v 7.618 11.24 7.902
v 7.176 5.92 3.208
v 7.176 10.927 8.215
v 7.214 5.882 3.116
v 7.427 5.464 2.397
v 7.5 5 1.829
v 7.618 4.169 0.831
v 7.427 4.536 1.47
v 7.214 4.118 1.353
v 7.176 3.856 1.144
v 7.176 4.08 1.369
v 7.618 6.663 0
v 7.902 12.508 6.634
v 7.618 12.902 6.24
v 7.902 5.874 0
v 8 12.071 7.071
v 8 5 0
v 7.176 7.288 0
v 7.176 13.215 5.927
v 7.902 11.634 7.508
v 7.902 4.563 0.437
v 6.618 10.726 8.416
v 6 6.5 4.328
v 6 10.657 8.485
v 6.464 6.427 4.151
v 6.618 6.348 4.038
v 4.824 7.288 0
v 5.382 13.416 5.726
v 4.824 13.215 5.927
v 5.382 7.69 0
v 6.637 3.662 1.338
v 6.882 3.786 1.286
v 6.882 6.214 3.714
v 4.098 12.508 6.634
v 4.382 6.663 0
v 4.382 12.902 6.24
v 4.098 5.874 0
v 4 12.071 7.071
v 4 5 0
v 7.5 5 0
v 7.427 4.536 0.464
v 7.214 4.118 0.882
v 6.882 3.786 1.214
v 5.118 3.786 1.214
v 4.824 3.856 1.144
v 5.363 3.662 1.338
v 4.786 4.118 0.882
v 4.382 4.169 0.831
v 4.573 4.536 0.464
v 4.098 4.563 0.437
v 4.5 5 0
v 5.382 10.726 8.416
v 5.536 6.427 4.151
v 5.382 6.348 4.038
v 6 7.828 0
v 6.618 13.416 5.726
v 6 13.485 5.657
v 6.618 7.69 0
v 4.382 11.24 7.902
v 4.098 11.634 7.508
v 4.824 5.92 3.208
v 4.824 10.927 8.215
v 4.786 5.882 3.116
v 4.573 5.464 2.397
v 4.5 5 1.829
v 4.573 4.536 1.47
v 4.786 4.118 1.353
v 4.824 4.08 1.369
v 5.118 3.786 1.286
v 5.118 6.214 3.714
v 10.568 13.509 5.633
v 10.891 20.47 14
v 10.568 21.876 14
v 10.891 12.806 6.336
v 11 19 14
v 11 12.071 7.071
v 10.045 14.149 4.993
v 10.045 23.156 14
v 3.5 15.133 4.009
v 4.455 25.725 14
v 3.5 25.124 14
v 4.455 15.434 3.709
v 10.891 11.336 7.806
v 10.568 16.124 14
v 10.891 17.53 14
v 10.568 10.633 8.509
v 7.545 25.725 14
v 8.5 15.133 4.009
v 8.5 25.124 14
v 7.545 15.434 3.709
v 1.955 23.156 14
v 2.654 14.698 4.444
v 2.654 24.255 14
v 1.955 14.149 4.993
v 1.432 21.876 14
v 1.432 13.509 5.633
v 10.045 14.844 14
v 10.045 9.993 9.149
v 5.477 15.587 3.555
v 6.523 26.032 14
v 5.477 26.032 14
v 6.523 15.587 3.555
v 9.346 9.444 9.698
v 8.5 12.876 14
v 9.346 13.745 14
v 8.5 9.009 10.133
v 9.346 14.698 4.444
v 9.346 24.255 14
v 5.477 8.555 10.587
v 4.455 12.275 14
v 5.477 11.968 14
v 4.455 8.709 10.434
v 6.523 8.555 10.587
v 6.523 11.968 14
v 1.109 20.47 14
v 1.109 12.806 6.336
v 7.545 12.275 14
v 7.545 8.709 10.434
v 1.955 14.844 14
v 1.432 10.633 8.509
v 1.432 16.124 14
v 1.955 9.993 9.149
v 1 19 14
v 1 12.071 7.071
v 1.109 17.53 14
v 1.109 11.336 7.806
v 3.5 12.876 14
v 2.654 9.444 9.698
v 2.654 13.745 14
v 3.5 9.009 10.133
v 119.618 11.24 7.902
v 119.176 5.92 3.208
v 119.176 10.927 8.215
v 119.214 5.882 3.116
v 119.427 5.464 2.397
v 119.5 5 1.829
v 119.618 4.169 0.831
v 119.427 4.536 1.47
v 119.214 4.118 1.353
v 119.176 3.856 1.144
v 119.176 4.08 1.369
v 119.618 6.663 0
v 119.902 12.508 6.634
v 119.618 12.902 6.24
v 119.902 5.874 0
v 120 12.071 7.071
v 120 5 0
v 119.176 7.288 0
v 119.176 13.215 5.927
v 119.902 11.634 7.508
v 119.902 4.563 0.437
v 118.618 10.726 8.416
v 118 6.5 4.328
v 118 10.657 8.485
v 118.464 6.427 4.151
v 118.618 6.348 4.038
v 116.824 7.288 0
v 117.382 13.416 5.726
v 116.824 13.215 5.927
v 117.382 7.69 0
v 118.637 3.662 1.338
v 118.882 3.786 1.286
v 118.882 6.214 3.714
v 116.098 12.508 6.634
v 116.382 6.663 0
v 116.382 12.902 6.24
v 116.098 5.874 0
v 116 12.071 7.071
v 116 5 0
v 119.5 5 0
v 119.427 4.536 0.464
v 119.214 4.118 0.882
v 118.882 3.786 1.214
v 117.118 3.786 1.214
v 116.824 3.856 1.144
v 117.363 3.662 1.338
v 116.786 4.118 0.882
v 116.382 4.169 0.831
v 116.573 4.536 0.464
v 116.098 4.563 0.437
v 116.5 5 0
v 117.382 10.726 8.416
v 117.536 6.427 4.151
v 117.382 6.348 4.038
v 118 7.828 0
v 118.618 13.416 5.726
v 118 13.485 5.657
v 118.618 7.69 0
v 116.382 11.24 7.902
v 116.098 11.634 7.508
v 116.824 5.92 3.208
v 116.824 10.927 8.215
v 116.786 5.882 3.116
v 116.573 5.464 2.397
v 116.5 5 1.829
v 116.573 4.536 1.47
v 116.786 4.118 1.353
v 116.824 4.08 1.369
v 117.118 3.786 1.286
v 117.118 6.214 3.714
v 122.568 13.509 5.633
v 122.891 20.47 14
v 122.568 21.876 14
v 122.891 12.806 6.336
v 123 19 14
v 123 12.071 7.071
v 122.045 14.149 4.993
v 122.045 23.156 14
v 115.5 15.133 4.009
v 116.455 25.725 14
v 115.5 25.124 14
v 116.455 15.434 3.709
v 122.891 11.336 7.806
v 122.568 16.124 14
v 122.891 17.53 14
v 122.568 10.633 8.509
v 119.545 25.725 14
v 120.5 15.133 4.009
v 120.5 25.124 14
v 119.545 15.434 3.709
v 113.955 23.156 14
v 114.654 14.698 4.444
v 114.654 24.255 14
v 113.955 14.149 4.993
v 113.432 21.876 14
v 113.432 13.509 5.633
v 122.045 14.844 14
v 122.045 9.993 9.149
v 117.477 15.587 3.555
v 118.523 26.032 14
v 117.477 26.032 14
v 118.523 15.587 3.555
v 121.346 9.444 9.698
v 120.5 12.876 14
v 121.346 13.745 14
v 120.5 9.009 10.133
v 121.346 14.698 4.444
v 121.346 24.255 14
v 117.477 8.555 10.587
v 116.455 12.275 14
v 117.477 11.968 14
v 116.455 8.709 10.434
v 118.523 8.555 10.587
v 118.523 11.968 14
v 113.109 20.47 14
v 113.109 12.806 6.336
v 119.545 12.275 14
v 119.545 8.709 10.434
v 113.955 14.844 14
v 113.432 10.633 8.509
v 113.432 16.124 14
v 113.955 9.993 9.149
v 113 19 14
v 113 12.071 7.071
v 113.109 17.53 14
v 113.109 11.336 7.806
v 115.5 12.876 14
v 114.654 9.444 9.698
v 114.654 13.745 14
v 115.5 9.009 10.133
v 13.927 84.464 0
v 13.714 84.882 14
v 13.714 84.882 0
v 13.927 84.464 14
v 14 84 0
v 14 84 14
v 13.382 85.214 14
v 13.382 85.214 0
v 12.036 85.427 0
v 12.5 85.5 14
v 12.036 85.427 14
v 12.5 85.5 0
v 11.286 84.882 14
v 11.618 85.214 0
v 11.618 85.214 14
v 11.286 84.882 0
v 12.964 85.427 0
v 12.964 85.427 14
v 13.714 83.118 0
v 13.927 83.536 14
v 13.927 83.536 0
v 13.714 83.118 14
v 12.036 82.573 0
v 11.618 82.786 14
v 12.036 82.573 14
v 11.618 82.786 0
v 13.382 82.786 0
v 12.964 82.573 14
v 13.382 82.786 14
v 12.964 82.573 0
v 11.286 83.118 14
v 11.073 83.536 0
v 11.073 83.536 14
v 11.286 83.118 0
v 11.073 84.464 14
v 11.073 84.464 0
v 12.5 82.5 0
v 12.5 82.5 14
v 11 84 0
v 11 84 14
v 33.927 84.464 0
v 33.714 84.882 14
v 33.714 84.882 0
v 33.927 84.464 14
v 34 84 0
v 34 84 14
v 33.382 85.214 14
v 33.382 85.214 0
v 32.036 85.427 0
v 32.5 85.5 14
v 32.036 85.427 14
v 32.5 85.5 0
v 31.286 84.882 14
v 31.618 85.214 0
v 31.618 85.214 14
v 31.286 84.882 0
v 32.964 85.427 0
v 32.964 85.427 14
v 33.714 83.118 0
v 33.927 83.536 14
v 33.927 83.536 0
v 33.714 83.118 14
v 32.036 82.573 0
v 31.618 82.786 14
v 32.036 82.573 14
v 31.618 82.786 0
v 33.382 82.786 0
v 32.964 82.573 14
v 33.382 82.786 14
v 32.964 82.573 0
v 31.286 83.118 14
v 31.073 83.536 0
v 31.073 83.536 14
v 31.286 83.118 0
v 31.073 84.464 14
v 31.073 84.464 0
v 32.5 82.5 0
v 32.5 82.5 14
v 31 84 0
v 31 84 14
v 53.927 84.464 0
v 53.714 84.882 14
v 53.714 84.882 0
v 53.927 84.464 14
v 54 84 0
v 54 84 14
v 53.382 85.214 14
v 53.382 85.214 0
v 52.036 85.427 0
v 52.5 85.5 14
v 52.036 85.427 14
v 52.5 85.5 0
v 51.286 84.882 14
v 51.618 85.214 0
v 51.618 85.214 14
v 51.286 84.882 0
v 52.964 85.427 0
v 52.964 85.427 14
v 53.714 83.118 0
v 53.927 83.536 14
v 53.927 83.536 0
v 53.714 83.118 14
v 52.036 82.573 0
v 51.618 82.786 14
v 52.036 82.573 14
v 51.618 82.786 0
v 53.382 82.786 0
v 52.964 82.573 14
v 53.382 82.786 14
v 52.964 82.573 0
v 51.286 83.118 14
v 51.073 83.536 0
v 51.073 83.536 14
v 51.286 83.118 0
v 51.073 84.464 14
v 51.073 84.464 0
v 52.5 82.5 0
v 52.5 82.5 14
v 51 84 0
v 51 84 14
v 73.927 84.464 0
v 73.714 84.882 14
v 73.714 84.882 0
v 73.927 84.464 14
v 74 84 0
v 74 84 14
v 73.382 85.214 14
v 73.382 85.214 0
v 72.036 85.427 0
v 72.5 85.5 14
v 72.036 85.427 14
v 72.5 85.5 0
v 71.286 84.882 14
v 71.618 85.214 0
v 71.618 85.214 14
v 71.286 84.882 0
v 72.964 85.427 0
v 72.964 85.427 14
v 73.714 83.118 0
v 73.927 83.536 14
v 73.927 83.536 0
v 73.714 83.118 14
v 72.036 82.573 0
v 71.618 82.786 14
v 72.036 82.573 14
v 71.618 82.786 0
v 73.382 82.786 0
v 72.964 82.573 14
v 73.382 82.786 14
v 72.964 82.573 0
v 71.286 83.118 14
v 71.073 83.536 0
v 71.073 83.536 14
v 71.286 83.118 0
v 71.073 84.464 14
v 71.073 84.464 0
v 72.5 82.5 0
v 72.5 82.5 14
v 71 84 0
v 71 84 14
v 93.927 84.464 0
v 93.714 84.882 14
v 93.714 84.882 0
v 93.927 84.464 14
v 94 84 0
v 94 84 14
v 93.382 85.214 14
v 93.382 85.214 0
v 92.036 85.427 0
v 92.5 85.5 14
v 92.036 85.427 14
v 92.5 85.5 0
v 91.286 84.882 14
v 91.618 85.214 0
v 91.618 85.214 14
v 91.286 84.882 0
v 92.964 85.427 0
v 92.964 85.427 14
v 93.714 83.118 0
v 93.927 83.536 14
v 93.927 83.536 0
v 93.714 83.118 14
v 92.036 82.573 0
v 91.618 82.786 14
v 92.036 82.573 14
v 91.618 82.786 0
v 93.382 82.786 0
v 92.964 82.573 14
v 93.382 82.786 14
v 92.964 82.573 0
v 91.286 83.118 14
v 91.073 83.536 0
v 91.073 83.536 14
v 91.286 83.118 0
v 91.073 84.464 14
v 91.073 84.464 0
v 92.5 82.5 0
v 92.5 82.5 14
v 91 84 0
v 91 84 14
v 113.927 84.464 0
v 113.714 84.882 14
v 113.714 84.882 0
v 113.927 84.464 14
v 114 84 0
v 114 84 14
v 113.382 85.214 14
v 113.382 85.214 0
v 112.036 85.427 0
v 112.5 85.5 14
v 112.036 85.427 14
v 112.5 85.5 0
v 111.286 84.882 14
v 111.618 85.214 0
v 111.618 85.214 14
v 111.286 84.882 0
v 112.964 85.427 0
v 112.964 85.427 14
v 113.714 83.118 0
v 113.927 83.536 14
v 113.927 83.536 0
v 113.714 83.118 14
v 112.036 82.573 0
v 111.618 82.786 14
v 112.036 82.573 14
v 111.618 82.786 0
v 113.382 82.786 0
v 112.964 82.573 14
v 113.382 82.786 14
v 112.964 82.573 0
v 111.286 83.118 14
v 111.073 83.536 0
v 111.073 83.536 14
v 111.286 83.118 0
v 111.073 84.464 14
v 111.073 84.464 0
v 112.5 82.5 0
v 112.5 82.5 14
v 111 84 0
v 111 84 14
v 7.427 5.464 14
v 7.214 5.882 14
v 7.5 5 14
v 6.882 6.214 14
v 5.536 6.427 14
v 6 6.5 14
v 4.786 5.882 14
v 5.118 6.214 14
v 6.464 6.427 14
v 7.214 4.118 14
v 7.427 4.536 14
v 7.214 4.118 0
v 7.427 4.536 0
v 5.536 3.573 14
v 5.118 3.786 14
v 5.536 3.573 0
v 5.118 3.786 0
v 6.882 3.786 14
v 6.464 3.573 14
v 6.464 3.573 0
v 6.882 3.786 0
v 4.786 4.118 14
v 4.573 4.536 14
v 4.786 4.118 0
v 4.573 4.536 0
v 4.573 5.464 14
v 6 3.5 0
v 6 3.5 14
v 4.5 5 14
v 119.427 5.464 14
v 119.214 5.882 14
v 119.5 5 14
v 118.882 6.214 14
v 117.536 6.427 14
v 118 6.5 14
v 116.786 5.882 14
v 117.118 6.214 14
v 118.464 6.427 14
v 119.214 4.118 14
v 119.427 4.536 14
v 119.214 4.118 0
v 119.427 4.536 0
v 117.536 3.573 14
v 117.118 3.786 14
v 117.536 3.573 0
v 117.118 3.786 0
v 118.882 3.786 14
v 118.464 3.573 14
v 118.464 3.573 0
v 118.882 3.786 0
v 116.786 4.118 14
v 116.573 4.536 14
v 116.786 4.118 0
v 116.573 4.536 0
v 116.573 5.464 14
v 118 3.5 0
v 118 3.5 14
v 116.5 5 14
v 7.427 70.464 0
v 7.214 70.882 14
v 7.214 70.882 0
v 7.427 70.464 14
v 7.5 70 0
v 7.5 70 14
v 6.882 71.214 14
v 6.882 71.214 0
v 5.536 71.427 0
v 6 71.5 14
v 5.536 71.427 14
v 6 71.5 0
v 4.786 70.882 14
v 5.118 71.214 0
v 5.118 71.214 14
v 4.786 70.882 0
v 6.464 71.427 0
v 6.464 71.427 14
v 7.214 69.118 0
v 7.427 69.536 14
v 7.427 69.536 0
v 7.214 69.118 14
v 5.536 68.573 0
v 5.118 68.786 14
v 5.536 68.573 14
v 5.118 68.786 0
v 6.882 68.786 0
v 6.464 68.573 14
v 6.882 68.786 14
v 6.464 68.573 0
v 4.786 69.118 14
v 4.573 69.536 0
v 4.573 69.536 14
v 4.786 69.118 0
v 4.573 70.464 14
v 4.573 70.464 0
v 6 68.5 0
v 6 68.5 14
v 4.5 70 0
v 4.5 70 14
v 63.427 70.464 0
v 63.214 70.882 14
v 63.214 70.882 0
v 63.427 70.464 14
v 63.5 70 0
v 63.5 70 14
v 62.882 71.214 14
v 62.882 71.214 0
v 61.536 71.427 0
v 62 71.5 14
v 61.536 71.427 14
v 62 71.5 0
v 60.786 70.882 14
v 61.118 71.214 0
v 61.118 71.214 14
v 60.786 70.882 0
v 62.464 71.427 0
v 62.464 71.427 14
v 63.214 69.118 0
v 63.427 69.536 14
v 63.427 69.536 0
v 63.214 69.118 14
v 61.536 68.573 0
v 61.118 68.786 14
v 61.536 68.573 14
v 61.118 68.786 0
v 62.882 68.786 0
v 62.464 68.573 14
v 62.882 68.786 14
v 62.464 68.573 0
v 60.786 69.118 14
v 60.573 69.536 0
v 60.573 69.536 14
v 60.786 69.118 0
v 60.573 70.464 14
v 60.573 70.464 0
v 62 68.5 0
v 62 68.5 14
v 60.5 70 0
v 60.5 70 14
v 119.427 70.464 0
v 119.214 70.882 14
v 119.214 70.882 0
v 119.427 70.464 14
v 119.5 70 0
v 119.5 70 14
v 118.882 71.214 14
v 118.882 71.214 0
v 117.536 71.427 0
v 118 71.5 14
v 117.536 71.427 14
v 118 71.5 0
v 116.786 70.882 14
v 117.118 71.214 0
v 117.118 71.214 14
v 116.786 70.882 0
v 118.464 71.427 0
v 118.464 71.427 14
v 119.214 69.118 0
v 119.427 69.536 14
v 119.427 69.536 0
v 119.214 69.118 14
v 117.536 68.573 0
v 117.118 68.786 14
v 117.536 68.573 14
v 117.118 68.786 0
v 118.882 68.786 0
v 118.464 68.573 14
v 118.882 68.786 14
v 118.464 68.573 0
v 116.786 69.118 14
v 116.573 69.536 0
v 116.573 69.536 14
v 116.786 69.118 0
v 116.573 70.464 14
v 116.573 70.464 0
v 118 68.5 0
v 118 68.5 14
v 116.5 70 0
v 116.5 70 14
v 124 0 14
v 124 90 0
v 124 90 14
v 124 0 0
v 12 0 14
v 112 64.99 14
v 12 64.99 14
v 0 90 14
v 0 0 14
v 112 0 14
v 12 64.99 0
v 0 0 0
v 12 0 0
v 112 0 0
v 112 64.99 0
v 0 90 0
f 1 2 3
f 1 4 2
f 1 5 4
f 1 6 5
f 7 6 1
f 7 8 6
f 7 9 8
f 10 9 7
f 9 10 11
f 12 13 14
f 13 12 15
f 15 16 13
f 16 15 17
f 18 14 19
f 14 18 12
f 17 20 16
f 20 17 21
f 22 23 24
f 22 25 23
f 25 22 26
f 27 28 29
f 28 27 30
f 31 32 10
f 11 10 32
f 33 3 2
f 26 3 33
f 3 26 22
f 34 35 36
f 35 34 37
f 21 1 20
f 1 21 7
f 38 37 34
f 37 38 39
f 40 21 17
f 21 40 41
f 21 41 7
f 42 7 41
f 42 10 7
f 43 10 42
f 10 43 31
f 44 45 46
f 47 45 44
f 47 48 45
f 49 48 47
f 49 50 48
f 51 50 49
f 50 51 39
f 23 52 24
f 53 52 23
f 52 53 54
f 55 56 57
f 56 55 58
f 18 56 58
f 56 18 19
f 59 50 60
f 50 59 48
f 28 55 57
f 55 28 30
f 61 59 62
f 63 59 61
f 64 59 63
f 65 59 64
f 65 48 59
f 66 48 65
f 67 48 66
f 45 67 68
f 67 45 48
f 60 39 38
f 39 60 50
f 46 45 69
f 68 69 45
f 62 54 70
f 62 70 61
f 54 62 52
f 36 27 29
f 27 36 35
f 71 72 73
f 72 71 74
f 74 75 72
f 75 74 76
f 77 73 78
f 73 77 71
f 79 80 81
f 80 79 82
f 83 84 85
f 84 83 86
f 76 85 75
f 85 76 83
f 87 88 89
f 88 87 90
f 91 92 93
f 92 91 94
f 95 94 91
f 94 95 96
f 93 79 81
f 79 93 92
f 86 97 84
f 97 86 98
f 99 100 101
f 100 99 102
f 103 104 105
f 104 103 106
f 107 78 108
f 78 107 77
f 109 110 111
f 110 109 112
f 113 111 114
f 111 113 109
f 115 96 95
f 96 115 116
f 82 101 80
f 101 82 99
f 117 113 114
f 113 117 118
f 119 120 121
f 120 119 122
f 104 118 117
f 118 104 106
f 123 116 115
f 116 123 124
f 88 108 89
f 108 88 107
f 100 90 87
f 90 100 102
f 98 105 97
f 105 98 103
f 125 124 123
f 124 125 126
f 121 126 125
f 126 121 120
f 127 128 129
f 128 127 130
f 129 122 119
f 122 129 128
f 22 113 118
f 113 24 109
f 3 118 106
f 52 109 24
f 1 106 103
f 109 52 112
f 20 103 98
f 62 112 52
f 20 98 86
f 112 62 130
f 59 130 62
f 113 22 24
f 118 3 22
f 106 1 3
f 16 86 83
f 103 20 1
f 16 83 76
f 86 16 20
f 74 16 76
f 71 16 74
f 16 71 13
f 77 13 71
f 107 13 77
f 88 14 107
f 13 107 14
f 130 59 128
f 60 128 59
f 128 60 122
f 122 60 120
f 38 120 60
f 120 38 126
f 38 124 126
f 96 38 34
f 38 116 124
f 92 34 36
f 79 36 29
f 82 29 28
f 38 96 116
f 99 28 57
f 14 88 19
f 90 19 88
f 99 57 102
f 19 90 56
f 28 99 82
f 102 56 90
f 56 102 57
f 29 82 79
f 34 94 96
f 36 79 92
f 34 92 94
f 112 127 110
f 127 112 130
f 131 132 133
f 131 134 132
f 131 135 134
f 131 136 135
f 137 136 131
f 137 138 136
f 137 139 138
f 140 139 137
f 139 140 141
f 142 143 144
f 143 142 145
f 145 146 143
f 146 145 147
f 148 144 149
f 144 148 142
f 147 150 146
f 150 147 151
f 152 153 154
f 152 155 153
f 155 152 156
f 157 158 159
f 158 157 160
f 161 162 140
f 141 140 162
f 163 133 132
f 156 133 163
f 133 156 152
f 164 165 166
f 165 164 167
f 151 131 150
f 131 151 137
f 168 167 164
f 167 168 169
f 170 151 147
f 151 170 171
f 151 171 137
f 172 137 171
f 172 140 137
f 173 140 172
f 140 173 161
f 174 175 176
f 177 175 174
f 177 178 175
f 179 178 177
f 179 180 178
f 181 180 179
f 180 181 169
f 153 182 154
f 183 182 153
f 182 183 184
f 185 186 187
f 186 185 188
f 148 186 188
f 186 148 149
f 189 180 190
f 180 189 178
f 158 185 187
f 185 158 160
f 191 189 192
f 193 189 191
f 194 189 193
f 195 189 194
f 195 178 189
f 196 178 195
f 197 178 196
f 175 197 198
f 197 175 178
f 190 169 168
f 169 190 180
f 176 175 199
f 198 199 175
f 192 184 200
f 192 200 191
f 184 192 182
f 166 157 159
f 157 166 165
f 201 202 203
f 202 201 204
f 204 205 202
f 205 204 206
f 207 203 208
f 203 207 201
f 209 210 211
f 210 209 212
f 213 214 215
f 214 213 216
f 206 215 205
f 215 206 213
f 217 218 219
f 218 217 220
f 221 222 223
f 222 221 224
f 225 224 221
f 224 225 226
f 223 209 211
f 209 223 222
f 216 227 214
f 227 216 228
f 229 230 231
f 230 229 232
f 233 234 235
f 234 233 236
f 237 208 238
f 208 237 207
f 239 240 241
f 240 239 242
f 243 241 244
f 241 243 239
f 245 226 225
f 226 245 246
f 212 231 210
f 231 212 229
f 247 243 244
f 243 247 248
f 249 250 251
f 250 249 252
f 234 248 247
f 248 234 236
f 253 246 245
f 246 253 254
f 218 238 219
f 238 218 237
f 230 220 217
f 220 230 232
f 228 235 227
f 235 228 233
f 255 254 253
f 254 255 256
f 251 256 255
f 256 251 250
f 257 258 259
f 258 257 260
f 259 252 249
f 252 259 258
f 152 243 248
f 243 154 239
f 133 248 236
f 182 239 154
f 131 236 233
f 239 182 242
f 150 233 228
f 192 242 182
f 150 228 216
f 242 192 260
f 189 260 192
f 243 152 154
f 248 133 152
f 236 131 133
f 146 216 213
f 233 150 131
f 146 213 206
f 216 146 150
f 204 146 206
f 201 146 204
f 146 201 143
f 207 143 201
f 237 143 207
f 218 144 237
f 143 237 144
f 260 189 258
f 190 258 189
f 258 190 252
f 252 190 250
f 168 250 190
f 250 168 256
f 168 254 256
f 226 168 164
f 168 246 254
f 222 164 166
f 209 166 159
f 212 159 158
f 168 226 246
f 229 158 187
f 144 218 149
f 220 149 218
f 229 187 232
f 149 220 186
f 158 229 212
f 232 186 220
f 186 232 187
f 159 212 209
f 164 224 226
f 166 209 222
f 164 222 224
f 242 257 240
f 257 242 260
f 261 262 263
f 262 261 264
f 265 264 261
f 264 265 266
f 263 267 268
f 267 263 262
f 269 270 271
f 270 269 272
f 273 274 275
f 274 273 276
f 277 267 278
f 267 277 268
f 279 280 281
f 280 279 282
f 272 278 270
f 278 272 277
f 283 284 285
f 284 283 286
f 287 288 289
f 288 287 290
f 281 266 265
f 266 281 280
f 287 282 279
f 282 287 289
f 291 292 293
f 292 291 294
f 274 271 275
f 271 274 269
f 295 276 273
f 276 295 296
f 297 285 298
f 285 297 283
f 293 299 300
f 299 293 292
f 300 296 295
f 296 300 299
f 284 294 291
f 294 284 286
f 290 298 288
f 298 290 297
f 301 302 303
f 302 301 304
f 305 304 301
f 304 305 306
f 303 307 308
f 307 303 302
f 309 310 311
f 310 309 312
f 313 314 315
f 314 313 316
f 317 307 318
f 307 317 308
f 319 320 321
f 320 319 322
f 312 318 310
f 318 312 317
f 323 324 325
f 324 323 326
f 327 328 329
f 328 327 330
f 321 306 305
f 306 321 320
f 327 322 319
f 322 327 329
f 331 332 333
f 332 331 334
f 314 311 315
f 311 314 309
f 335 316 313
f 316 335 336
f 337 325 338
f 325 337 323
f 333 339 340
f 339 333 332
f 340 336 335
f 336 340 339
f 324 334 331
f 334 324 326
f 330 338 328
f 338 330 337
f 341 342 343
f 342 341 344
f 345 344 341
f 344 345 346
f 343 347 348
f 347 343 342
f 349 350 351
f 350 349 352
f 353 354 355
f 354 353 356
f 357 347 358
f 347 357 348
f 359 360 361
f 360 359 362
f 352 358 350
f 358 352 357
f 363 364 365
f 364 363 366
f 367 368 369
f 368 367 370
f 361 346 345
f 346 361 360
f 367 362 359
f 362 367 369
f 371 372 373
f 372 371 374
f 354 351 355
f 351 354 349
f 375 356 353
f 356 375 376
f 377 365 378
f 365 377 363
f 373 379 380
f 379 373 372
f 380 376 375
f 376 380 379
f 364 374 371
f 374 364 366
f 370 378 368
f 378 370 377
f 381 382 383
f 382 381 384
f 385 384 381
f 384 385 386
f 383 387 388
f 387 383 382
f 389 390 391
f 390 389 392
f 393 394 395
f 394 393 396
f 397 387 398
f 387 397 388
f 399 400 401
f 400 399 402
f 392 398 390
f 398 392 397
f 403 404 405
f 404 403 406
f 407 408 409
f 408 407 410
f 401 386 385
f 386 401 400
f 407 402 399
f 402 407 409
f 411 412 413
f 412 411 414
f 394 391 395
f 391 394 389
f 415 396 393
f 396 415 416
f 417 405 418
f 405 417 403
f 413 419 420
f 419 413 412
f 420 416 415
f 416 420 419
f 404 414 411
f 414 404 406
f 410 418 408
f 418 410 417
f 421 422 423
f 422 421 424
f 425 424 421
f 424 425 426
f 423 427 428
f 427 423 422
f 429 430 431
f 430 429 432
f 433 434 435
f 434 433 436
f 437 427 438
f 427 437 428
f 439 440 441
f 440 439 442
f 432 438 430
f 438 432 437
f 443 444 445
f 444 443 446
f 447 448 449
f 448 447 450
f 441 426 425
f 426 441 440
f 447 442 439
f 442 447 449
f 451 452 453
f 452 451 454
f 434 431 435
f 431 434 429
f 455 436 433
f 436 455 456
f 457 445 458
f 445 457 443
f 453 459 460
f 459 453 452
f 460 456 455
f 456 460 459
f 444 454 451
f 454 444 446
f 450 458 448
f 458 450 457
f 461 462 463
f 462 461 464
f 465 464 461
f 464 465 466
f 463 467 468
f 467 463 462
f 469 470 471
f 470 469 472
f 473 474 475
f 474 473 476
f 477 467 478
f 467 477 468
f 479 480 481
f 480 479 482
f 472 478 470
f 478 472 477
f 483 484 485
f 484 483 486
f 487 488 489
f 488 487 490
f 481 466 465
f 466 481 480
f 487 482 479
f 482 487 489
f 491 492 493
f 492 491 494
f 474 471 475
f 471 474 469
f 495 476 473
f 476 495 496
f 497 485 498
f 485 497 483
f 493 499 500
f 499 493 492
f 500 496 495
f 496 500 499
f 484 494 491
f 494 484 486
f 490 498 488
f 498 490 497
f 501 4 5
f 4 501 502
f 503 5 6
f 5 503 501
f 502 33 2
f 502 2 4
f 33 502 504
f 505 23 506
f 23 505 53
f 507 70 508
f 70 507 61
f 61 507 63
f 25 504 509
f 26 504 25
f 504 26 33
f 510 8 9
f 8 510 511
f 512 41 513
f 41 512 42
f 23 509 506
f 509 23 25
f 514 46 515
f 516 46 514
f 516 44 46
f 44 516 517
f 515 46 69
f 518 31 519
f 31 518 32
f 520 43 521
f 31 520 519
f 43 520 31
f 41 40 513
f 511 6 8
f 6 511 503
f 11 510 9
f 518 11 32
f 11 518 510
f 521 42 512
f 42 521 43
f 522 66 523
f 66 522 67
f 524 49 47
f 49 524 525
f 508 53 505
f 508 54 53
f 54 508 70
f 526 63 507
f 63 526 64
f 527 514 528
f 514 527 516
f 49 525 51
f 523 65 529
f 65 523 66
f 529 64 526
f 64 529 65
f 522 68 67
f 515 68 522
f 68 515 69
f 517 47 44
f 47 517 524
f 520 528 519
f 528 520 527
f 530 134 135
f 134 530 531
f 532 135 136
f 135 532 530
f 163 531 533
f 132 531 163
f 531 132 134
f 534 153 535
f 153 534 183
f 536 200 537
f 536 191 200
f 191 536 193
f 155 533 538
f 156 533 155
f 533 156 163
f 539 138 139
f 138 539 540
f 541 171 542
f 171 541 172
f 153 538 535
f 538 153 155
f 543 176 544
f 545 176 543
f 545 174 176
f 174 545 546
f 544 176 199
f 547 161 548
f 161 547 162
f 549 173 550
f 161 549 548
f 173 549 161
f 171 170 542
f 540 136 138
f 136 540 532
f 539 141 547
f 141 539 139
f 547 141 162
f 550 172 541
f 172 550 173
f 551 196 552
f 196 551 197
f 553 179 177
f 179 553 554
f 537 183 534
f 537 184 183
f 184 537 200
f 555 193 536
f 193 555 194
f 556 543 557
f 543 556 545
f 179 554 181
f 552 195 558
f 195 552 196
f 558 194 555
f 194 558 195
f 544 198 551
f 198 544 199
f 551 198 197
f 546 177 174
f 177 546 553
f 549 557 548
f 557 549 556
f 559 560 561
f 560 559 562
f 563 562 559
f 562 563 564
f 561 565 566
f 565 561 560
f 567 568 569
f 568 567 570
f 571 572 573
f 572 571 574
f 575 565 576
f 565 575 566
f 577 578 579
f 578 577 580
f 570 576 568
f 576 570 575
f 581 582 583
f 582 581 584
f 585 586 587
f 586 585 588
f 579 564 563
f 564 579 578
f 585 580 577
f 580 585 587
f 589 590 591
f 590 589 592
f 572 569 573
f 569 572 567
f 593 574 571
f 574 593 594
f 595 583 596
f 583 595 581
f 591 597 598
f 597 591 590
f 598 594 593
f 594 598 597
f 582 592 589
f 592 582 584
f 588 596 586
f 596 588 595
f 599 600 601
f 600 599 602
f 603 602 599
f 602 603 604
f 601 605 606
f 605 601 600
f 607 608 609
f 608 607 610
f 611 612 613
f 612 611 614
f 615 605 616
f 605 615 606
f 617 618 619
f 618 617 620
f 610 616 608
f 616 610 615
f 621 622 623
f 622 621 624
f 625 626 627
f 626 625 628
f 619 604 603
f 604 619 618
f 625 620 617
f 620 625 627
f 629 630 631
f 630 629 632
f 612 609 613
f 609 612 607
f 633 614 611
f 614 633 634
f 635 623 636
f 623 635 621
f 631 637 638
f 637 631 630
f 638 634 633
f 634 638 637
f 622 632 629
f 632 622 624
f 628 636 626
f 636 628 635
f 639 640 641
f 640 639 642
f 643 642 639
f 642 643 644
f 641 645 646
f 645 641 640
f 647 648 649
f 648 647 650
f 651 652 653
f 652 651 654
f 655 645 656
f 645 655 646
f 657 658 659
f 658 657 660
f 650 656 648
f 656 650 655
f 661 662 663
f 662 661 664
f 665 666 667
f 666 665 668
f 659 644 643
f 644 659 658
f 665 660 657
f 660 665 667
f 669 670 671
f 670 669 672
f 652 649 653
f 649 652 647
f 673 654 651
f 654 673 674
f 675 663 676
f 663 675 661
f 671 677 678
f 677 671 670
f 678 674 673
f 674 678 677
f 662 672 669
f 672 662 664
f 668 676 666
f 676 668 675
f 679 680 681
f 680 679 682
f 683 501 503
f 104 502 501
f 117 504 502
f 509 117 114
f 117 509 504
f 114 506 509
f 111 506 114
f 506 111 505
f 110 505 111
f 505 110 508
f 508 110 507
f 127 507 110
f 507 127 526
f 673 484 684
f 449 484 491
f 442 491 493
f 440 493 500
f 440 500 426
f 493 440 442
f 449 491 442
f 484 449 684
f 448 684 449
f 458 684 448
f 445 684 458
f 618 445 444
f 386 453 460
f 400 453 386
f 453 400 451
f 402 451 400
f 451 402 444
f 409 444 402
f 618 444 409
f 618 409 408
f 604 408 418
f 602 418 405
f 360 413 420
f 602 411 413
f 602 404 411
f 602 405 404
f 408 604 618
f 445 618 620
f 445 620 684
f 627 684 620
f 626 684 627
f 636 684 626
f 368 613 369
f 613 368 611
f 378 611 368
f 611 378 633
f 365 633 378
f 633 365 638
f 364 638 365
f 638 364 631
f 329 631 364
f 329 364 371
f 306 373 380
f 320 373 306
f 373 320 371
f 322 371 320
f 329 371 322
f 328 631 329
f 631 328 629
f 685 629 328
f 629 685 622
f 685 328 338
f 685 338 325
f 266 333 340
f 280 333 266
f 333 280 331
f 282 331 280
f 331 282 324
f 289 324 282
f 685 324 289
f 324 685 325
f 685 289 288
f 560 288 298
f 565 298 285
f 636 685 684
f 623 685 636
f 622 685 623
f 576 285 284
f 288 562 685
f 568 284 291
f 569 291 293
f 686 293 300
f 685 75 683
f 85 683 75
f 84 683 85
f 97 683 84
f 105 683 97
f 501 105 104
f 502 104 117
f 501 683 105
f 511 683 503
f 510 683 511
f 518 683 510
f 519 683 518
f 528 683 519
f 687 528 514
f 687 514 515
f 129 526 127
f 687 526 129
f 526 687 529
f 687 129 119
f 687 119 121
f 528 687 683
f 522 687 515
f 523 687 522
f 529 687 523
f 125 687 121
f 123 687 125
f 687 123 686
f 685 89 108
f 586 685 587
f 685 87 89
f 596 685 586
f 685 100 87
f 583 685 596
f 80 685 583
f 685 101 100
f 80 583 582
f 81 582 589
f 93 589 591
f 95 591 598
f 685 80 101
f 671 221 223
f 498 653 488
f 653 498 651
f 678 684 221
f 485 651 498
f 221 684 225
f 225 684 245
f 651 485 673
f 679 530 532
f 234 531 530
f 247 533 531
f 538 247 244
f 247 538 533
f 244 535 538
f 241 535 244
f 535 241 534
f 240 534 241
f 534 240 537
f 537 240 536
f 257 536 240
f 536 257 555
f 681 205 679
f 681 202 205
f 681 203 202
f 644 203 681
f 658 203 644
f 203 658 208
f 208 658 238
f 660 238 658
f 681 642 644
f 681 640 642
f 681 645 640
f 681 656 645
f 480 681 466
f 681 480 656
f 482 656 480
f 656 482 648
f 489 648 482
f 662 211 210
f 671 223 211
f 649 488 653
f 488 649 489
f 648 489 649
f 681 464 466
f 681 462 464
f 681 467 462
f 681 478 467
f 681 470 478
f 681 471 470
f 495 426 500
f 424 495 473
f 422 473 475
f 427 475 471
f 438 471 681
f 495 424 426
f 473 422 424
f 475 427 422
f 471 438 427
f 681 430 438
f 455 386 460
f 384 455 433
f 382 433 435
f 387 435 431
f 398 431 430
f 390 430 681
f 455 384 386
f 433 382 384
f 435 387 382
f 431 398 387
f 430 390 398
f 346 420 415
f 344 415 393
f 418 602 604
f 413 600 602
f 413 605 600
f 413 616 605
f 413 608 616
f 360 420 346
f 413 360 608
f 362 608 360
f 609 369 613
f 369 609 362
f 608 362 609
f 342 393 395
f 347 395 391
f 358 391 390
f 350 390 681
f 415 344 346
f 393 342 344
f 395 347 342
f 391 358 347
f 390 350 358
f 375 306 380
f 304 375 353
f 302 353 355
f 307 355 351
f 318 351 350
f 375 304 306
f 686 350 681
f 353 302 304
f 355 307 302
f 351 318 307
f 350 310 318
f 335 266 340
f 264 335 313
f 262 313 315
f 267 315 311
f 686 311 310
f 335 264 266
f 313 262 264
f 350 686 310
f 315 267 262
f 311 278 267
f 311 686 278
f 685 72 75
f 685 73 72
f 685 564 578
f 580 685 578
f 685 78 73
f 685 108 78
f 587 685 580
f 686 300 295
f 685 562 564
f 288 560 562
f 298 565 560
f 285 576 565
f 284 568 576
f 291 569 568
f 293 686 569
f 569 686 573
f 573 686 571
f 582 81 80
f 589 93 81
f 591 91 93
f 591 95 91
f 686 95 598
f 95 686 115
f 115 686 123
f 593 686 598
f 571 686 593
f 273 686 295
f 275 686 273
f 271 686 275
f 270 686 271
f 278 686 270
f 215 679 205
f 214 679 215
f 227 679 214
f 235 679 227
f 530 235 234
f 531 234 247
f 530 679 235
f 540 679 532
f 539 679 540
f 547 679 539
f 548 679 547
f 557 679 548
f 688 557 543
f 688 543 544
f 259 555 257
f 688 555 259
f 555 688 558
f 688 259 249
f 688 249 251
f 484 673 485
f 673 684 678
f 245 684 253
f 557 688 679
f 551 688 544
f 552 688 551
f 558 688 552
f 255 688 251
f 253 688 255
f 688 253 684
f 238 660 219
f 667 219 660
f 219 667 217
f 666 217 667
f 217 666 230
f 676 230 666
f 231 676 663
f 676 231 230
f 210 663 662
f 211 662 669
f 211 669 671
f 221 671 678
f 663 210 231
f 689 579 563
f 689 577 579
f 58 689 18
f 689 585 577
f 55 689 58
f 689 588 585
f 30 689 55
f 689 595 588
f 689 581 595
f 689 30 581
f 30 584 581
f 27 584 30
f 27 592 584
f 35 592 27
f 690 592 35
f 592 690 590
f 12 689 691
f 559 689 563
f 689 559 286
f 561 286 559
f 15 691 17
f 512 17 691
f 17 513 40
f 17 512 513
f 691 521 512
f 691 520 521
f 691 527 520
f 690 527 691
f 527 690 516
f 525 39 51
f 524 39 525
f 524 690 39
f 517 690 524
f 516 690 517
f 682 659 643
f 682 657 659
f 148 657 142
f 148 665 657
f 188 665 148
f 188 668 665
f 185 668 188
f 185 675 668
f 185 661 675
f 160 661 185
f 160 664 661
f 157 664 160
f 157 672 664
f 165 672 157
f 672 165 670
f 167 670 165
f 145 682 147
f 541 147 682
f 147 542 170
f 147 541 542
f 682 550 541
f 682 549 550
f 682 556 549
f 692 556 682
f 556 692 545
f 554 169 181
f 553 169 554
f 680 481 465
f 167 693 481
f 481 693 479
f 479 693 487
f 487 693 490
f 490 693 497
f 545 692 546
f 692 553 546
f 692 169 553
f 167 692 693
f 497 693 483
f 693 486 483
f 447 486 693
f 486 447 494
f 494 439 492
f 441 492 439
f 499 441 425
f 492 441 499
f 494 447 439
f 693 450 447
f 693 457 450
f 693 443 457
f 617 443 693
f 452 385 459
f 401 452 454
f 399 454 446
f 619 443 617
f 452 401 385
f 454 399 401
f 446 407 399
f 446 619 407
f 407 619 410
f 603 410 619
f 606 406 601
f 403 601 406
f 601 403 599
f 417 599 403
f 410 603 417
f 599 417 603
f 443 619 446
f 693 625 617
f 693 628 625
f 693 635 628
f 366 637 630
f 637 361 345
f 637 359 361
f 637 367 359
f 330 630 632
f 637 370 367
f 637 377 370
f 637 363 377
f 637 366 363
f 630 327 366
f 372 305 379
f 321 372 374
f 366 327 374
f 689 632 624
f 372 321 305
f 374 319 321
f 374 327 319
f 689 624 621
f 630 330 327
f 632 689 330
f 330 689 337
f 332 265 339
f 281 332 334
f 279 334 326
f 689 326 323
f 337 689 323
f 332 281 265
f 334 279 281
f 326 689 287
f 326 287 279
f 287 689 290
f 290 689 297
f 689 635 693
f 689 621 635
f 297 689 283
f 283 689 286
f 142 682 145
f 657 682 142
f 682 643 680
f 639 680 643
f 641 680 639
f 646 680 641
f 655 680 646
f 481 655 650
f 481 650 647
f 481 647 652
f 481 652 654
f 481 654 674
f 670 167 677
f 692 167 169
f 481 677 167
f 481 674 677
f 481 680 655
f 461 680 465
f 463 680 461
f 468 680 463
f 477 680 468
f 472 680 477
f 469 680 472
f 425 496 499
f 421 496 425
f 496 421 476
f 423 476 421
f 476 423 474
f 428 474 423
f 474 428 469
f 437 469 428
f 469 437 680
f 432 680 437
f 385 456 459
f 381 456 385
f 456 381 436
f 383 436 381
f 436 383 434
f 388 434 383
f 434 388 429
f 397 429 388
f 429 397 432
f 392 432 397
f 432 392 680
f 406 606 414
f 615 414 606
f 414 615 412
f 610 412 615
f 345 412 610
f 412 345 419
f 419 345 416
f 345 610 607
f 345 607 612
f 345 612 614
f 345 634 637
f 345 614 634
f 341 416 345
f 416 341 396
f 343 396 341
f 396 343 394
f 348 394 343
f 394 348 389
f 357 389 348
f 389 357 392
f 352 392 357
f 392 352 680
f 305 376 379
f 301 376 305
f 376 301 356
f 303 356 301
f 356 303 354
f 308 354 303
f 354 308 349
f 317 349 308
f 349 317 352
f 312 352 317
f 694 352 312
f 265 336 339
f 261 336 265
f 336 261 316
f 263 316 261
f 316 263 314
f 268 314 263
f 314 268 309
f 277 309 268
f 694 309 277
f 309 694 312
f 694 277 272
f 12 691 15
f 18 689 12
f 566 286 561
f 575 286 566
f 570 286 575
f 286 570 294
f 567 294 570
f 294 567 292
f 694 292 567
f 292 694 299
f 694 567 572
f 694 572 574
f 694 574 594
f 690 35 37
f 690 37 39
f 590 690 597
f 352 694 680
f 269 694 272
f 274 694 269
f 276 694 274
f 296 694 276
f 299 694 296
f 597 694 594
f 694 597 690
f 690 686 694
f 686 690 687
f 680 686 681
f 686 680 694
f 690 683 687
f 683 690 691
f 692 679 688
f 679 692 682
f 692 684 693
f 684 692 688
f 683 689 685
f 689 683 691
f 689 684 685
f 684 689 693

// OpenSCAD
difference() {
  cube([124,90,14]);
  translate([12,-.01,-.01])
    cube([100,65,14.02]);
  for(x=[6,118])
  translate([x,5]) rotate([-45,0]) {
    cylinder(d=4,h=30,$fn=20);
    translate([0,0,10]) cylinder(d=10,h=20,$fn=30);
  }
  for(x=[12.5:20:120]) translate([x,84,-.01]) cylinder(d=3,h=14.02,$fn=20);
  for(y=[5,70],x=[6,62,118]) translate([x,y,-.01]) cylinder(d=3,h=14.02,$fn=20);
}
